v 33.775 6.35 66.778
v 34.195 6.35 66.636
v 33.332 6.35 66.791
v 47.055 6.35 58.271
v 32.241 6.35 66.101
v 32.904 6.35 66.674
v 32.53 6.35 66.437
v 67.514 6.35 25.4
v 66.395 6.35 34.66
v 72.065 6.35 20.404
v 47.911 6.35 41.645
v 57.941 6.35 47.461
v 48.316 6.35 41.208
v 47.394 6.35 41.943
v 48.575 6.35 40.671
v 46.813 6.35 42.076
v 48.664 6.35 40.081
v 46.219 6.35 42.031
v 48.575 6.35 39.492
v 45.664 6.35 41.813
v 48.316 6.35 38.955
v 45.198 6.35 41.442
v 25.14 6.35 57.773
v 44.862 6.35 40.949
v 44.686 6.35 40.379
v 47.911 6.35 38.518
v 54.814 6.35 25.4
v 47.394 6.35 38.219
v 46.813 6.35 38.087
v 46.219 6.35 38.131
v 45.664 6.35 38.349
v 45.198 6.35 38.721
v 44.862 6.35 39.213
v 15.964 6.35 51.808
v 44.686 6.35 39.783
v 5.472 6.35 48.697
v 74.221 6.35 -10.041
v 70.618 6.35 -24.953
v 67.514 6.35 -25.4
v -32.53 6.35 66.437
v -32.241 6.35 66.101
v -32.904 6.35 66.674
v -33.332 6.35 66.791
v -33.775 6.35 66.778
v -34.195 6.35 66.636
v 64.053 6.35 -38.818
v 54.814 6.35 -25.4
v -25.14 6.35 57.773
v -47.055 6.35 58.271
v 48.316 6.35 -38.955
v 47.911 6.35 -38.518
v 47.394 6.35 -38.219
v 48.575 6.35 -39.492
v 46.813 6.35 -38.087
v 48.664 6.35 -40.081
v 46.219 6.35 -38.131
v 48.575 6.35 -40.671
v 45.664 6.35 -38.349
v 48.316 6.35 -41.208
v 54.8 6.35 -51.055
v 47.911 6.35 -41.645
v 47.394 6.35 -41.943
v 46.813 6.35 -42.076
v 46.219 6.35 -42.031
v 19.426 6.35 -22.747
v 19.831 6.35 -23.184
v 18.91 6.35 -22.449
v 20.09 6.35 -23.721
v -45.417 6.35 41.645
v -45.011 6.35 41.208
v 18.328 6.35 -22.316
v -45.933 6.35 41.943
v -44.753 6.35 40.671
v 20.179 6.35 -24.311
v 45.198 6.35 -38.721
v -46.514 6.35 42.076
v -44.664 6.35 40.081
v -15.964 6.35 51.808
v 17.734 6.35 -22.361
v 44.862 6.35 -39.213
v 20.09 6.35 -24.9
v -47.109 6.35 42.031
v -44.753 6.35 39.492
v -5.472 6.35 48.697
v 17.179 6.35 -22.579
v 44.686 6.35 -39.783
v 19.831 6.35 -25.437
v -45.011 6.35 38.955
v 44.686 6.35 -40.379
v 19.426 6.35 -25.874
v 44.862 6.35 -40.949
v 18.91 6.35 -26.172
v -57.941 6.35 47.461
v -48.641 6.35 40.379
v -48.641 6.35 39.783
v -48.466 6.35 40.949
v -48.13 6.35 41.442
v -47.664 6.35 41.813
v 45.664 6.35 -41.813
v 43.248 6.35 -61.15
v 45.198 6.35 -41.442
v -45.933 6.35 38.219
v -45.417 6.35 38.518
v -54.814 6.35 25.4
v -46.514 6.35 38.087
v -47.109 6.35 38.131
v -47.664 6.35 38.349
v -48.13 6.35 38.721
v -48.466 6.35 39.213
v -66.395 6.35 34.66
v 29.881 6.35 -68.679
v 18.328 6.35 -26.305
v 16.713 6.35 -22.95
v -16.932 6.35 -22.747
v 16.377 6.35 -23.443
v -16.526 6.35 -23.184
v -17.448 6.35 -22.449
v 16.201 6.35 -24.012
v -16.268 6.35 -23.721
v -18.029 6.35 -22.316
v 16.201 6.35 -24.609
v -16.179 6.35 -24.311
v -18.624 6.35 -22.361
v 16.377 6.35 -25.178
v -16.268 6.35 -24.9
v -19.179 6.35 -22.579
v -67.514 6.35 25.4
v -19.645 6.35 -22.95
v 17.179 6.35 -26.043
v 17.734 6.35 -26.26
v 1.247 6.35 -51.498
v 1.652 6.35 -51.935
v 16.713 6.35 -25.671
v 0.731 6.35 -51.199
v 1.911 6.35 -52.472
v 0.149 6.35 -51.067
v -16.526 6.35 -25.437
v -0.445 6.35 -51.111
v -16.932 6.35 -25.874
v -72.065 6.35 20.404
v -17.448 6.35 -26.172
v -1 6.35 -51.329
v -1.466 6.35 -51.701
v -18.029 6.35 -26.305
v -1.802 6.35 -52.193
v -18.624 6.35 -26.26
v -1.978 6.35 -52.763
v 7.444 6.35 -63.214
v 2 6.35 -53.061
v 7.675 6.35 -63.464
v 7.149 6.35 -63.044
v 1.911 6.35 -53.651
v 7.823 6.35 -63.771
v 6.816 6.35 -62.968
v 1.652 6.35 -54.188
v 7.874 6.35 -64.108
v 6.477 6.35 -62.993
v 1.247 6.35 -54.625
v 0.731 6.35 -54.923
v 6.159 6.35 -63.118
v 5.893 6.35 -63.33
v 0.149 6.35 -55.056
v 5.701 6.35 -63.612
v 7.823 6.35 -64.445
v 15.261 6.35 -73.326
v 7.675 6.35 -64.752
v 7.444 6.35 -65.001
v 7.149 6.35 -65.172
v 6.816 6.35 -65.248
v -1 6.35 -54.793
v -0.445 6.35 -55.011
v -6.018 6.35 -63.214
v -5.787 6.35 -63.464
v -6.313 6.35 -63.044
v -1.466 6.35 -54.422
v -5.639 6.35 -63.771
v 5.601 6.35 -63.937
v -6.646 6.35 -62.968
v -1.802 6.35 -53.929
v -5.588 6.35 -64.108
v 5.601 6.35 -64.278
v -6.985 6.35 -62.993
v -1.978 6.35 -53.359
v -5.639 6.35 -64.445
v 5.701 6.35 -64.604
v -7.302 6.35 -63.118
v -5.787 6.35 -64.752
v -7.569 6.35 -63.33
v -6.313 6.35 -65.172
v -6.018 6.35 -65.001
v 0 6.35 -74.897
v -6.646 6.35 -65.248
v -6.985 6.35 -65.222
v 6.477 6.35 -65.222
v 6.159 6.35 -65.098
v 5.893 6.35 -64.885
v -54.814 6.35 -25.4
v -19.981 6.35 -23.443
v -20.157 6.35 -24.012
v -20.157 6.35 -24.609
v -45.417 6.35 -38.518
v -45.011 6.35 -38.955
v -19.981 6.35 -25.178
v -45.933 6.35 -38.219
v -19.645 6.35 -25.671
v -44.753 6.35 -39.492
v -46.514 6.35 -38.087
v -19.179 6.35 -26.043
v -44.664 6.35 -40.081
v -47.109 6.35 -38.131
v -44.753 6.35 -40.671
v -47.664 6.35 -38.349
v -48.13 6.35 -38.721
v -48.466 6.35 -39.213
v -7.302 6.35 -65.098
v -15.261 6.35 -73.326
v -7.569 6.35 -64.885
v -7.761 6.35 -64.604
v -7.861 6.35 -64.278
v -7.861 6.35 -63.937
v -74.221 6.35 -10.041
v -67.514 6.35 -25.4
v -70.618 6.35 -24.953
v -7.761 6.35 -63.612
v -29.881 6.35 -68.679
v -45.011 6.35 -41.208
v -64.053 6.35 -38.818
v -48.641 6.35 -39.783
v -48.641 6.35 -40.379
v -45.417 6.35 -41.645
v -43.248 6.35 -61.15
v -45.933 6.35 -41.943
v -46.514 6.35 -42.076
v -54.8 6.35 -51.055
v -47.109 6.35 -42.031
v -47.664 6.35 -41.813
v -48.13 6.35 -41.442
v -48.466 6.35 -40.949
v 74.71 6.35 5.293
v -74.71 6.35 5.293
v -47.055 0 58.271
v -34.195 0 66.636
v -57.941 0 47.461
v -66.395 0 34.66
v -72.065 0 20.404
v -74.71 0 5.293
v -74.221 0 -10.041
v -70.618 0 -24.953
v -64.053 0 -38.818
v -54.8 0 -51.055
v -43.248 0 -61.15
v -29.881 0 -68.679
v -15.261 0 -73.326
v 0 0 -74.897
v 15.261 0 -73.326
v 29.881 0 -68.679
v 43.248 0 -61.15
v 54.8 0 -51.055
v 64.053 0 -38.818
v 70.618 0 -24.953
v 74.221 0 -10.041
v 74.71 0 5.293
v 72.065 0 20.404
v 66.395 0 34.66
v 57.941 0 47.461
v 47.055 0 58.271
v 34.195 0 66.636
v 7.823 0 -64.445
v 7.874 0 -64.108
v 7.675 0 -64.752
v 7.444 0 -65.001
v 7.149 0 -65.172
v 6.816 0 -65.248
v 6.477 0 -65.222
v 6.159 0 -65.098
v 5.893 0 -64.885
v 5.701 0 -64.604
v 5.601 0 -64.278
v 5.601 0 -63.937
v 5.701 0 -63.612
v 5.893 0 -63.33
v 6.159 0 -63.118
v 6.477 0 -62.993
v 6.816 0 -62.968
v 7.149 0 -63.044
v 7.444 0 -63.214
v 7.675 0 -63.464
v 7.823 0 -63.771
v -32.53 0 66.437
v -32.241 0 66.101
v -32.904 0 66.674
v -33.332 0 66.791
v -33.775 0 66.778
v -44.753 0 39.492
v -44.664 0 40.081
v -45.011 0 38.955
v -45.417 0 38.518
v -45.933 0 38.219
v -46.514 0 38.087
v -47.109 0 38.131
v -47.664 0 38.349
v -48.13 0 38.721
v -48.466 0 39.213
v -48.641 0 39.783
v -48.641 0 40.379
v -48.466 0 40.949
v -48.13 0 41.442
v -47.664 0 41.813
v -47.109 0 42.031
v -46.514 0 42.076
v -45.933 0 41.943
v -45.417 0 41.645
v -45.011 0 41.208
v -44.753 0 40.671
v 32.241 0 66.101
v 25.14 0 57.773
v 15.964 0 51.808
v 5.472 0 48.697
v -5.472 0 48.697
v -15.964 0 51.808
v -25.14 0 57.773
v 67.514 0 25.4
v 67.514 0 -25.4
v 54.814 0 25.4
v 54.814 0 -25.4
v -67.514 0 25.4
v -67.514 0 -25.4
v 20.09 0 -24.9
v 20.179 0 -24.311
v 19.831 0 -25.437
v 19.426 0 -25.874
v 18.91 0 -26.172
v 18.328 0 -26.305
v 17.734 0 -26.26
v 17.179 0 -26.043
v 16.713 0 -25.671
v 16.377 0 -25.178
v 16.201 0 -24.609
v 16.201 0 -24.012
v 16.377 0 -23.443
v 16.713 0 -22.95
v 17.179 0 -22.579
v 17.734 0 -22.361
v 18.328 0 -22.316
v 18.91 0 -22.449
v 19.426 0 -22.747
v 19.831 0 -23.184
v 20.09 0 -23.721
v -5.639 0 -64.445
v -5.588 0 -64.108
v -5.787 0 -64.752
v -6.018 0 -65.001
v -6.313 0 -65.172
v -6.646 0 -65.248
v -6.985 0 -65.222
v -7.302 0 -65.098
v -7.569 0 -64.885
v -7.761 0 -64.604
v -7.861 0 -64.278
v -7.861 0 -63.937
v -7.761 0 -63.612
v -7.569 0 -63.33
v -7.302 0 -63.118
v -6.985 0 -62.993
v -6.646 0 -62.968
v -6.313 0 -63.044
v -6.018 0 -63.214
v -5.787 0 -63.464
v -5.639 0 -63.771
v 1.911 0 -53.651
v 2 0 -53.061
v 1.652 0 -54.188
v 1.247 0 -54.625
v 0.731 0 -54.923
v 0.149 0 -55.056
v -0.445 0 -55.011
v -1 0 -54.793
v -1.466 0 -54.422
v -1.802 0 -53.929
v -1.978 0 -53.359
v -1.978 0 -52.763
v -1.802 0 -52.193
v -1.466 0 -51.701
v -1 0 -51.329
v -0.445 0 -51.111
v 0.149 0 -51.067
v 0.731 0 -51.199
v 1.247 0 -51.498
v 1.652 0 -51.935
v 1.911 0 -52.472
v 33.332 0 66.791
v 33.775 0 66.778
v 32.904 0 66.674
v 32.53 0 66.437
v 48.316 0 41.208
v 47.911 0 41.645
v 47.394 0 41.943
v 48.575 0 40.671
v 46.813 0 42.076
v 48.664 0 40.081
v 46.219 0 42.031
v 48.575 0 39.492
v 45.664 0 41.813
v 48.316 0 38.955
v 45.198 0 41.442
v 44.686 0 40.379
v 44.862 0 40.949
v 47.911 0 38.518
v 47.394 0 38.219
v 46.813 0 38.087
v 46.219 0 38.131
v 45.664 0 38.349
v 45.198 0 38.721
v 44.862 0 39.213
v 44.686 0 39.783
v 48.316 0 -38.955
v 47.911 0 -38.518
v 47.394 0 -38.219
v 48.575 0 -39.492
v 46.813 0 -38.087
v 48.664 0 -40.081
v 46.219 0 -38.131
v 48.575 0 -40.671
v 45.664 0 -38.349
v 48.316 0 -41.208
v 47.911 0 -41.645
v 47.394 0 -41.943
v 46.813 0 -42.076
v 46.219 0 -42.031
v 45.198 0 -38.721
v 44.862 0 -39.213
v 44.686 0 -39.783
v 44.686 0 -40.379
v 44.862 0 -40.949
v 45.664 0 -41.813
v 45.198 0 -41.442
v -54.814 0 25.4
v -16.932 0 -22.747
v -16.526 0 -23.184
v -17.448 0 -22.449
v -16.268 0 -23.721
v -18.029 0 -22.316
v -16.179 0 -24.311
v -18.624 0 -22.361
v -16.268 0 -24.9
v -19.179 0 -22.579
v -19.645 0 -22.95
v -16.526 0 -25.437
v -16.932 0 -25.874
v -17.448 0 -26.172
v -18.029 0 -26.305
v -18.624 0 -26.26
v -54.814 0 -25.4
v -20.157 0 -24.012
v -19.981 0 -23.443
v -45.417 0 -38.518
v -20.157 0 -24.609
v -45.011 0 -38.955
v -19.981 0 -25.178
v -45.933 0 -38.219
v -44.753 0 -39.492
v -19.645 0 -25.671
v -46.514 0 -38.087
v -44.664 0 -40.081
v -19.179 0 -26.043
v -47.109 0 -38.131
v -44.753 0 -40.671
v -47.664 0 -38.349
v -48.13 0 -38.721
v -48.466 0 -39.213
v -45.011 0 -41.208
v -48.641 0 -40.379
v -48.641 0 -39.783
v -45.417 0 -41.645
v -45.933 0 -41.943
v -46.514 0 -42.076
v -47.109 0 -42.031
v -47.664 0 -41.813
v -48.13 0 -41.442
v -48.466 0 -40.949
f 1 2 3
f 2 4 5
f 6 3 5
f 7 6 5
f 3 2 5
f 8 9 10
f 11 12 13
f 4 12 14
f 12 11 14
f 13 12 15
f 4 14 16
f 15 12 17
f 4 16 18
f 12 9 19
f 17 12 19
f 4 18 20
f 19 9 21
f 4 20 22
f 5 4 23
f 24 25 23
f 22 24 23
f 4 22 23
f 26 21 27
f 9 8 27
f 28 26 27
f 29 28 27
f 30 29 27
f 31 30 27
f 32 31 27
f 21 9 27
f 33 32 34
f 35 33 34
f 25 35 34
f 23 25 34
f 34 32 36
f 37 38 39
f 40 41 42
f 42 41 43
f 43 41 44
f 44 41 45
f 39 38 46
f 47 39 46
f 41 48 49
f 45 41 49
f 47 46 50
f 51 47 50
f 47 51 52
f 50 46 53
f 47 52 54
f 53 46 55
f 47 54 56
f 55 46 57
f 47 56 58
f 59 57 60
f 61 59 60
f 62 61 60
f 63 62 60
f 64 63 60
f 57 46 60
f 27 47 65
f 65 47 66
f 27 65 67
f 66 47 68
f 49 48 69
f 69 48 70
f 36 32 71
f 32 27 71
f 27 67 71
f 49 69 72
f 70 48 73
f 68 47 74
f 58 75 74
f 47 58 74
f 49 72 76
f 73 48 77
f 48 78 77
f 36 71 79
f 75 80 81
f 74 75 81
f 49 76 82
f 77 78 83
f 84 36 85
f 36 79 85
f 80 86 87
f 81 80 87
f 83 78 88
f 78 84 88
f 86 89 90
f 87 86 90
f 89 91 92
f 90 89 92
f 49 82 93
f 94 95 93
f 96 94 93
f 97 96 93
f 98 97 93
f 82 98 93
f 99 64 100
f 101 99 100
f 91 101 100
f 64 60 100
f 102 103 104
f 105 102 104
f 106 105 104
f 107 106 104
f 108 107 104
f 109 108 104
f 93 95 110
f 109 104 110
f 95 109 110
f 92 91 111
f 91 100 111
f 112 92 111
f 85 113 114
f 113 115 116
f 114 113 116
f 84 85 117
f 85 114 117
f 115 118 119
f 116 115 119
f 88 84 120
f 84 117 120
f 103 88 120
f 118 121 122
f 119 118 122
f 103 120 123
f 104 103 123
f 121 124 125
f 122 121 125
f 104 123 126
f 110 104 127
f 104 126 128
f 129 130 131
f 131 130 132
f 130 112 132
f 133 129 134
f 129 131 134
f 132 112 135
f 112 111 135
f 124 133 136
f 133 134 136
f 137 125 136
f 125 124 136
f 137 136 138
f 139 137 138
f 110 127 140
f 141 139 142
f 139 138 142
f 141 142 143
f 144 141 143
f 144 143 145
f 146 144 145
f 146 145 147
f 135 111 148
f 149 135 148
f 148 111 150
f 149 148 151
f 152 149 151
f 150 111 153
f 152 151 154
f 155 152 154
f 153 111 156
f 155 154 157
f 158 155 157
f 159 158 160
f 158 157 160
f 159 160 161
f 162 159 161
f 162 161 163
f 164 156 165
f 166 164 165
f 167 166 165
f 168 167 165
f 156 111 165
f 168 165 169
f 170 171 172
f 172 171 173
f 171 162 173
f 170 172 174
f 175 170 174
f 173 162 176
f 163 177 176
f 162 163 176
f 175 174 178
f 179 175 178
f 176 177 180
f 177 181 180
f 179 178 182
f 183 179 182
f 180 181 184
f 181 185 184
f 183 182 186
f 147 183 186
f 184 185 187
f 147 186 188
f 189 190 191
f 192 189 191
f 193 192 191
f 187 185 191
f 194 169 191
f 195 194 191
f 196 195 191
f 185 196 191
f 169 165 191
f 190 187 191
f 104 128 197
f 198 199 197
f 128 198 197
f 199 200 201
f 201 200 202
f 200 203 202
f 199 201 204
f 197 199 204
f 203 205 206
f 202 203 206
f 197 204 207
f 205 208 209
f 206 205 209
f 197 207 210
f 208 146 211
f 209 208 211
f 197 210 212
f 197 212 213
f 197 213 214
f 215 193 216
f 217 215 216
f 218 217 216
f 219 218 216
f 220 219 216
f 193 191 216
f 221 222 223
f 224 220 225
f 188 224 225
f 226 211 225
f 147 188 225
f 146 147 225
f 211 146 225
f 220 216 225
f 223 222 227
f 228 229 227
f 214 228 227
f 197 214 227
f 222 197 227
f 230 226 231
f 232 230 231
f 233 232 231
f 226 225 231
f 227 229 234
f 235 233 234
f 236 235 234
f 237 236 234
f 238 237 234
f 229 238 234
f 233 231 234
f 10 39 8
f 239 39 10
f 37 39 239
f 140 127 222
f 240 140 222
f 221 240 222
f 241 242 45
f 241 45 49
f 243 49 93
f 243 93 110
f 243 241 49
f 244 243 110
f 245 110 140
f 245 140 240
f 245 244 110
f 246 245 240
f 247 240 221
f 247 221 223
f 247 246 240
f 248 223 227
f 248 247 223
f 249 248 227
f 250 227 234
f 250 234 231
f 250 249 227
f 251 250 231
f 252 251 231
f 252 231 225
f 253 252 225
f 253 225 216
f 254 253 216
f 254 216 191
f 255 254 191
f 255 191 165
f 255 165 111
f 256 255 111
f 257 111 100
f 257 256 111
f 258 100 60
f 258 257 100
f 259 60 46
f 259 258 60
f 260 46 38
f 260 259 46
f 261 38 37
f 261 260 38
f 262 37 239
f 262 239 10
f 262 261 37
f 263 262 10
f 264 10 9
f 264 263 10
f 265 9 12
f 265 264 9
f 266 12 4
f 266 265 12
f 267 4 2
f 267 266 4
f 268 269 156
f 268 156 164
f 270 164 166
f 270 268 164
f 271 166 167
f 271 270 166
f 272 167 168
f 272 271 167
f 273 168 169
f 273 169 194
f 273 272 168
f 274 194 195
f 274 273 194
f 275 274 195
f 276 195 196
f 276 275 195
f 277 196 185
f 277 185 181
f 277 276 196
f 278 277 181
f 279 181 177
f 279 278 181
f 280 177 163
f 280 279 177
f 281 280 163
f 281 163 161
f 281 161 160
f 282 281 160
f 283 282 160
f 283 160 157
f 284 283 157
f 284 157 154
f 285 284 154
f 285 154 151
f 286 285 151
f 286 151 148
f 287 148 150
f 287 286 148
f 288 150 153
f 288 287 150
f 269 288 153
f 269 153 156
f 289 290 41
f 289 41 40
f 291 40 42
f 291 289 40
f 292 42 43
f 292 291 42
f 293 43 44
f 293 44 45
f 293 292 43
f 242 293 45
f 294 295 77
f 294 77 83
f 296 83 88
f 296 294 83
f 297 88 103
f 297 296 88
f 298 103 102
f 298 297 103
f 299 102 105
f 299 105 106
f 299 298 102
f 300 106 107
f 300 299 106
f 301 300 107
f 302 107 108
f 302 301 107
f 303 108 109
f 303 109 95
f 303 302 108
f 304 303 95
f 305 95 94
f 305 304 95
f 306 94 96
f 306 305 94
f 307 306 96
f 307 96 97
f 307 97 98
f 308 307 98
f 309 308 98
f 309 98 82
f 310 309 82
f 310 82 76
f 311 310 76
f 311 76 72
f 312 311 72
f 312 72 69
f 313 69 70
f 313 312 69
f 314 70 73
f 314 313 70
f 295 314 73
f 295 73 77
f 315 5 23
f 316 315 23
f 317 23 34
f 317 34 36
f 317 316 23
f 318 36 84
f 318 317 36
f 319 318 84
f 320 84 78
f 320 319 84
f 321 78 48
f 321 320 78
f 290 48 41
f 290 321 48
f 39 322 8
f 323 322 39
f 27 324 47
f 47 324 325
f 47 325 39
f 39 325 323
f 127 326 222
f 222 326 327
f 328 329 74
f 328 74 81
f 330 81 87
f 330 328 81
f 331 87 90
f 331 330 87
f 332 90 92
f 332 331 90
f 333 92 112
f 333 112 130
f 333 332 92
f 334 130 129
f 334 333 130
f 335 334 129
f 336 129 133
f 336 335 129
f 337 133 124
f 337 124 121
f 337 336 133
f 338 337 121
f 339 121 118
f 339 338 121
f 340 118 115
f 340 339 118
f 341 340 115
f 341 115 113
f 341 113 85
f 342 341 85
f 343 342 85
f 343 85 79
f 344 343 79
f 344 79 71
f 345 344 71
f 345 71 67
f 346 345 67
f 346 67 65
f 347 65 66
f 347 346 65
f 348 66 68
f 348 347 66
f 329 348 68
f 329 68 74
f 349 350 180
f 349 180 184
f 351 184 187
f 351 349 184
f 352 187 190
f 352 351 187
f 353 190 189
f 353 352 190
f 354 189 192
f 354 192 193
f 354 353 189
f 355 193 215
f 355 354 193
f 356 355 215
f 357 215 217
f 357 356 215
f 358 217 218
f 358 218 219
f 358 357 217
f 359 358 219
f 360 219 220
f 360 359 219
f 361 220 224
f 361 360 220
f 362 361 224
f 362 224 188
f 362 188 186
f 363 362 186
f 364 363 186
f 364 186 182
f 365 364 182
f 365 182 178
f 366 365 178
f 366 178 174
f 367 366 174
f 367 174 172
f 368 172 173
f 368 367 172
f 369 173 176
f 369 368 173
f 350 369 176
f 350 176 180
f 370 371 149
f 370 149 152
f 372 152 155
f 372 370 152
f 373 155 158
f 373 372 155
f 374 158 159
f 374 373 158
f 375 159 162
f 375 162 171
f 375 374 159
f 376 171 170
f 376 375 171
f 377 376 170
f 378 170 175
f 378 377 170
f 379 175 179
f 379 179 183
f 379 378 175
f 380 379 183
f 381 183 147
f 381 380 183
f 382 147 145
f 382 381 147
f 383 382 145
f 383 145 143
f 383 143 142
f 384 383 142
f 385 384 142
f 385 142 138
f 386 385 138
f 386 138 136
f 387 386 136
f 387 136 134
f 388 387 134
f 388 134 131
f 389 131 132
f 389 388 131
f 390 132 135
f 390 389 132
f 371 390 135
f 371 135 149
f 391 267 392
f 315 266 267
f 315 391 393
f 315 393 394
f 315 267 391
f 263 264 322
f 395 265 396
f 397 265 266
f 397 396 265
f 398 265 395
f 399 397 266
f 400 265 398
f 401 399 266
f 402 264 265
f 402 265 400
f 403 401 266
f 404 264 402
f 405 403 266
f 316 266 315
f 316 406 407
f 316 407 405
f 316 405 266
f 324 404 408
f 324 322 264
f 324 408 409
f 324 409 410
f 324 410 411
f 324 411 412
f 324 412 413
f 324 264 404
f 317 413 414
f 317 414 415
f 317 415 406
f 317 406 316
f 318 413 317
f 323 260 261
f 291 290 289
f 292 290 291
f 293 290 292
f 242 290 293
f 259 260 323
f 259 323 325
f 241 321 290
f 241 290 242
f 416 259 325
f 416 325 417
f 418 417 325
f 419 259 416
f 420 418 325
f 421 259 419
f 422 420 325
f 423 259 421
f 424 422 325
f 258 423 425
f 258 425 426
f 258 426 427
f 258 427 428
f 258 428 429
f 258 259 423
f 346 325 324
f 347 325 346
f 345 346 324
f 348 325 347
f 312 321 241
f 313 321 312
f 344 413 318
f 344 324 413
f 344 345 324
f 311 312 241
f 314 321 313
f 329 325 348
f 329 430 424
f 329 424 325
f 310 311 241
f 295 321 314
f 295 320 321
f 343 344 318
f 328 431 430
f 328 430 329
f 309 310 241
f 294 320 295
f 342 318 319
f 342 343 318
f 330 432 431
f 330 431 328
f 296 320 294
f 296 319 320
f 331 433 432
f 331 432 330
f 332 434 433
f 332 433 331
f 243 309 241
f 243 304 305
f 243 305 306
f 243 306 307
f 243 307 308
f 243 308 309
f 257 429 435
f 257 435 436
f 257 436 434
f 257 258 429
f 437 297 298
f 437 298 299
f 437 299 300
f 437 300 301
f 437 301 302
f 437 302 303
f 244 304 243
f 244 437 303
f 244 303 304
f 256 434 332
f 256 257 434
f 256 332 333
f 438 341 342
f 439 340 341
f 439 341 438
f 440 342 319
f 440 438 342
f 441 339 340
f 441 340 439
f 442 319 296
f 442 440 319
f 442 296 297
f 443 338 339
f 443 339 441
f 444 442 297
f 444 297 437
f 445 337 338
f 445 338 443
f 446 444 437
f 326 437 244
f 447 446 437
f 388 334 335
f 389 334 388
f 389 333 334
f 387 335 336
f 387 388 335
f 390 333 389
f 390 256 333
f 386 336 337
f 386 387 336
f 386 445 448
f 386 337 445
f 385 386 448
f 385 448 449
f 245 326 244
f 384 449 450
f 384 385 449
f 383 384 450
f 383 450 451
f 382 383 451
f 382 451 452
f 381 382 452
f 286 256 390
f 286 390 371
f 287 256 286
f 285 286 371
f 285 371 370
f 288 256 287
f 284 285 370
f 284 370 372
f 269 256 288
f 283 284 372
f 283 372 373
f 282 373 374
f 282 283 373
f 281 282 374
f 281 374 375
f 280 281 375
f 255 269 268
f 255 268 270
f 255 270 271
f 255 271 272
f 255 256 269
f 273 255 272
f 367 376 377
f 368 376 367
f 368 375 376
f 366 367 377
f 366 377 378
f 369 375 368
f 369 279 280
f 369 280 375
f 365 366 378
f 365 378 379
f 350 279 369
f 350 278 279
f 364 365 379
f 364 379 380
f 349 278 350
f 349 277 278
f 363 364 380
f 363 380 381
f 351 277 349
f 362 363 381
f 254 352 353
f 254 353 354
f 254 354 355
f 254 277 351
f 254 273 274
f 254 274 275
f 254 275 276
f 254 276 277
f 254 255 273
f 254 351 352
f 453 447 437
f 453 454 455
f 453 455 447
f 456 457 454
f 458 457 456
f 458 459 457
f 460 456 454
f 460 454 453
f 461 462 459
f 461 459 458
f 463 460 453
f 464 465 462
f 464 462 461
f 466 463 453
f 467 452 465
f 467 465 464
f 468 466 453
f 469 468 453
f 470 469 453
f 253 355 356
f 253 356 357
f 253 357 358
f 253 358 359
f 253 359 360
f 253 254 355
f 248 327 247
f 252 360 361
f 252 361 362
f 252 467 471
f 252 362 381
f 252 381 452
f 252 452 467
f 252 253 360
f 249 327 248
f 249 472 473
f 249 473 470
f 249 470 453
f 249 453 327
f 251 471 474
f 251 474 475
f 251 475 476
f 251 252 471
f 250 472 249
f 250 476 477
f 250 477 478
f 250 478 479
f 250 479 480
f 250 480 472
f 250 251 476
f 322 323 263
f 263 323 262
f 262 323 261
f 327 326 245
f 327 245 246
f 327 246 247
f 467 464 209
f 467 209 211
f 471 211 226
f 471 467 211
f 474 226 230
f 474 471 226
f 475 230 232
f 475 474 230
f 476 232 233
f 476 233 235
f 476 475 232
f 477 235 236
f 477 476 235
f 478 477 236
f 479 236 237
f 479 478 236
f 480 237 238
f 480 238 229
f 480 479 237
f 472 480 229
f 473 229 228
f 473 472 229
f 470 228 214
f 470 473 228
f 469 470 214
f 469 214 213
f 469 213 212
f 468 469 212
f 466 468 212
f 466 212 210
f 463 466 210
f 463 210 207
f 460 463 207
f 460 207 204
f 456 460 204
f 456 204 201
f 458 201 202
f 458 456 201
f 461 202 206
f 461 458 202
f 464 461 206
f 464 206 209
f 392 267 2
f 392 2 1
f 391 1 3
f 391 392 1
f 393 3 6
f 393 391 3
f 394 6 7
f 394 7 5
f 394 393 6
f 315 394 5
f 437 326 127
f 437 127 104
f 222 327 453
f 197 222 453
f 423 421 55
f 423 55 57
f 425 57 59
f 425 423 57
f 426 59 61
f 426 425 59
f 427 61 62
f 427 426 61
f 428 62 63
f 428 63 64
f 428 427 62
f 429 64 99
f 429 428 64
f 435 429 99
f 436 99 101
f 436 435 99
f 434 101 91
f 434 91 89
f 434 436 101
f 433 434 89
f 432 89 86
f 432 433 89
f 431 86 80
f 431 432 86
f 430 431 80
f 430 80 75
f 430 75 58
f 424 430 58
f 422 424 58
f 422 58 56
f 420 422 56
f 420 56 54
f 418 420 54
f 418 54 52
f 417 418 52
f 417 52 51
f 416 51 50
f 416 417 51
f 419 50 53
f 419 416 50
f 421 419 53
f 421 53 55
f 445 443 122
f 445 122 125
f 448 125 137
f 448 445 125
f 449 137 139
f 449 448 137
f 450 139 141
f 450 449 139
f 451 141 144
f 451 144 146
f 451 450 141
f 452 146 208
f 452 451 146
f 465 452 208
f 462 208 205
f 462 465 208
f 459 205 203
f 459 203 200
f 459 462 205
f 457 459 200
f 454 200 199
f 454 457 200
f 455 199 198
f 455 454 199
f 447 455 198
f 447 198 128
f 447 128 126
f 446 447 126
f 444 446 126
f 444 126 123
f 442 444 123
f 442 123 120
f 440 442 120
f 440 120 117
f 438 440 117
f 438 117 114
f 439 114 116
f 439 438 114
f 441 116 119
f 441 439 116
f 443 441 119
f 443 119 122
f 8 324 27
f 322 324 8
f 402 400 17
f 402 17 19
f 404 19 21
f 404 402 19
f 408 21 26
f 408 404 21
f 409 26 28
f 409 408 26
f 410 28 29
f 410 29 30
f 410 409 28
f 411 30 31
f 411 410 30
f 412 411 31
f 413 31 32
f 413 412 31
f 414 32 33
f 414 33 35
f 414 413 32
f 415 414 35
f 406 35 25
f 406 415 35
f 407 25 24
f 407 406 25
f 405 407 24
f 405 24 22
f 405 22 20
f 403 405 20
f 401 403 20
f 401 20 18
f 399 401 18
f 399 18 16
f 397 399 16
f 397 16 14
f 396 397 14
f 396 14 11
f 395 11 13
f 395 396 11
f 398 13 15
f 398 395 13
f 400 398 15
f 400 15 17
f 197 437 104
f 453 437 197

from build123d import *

# Parameters (mm, degrees)
SKETCH1_R           = 2
SKETCH1_R_2         = 1.143
SKETCH1_W           = 12.7
SKETCH1_H           = 50.8
BOSS_EXTRUDE3_DEPTH = 6.35


with BuildPart() as part:
    # Sketch1 → Boss-Extrude3 (new body)
    with BuildSketch(Plane(origin=(0, 0, 0), x_dir=(1, 0, 0), z_dir=(0, 1, 0))):
        with BuildLine():
            ThreePointArc((32.240681933, -66.10056535), (0, -48.302004425), (-32.240681933, -66.10056535))
            ThreePointArc((-32.240681933, -66.10056535), (-33.11372382, -66.748004461), (-34.194833578, -66.63583839))
            ThreePointArc((-34.194833578, -66.63583839), (0, 74.897407173), (34.194833578, -66.63583839))
            ThreePointArc((34.194833578, -66.63583839), (33.11372382, -66.748004461), (32.240681933, -66.10056535))
        make_face()
        with Locations((-18.178952795, 24.310551096)):
            Circle(SKETCH1_R, mode=Mode.SUBTRACT)
        with Locations((-46.663733983, -40.081231883)):
            Circle(SKETCH1_R, mode=Mode.SUBTRACT)
        with Locations((46.663733983, -40.081231883)):
            Circle(SKETCH1_R, mode=Mode.SUBTRACT)
        with Locations((46.663733983, 40.081231883)):
            Circle(SKETCH1_R, mode=Mode.SUBTRACT)
        with Locations((-46.663733983, 40.081231883)):
            Circle(SKETCH1_R, mode=Mode.SUBTRACT)
        with Locations((-6.731, 64.107698843)):
            Circle(SKETCH1_R_2, mode=Mode.SUBTRACT)
        with Locations((6.731, 64.107698843)):
            Circle(SKETCH1_R_2, mode=Mode.SUBTRACT)
        with Locations((18.178952795, 24.310551096)):
            Circle(SKETCH1_R, mode=Mode.SUBTRACT)
        with Locations((0, 53.061187965)):
            Circle(SKETCH1_R, mode=Mode.SUBTRACT)
        with Locations((61.164123727, 0)):
            Rectangle(SKETCH1_W, SKETCH1_H, mode=Mode.SUBTRACT)
        with Locations((-61.164123727, 0)):
            Rectangle(SKETCH1_W, SKETCH1_H, mode=Mode.SUBTRACT)
    extrude(amount=BOSS_EXTRUDE3_DEPTH)


solid = part.part
